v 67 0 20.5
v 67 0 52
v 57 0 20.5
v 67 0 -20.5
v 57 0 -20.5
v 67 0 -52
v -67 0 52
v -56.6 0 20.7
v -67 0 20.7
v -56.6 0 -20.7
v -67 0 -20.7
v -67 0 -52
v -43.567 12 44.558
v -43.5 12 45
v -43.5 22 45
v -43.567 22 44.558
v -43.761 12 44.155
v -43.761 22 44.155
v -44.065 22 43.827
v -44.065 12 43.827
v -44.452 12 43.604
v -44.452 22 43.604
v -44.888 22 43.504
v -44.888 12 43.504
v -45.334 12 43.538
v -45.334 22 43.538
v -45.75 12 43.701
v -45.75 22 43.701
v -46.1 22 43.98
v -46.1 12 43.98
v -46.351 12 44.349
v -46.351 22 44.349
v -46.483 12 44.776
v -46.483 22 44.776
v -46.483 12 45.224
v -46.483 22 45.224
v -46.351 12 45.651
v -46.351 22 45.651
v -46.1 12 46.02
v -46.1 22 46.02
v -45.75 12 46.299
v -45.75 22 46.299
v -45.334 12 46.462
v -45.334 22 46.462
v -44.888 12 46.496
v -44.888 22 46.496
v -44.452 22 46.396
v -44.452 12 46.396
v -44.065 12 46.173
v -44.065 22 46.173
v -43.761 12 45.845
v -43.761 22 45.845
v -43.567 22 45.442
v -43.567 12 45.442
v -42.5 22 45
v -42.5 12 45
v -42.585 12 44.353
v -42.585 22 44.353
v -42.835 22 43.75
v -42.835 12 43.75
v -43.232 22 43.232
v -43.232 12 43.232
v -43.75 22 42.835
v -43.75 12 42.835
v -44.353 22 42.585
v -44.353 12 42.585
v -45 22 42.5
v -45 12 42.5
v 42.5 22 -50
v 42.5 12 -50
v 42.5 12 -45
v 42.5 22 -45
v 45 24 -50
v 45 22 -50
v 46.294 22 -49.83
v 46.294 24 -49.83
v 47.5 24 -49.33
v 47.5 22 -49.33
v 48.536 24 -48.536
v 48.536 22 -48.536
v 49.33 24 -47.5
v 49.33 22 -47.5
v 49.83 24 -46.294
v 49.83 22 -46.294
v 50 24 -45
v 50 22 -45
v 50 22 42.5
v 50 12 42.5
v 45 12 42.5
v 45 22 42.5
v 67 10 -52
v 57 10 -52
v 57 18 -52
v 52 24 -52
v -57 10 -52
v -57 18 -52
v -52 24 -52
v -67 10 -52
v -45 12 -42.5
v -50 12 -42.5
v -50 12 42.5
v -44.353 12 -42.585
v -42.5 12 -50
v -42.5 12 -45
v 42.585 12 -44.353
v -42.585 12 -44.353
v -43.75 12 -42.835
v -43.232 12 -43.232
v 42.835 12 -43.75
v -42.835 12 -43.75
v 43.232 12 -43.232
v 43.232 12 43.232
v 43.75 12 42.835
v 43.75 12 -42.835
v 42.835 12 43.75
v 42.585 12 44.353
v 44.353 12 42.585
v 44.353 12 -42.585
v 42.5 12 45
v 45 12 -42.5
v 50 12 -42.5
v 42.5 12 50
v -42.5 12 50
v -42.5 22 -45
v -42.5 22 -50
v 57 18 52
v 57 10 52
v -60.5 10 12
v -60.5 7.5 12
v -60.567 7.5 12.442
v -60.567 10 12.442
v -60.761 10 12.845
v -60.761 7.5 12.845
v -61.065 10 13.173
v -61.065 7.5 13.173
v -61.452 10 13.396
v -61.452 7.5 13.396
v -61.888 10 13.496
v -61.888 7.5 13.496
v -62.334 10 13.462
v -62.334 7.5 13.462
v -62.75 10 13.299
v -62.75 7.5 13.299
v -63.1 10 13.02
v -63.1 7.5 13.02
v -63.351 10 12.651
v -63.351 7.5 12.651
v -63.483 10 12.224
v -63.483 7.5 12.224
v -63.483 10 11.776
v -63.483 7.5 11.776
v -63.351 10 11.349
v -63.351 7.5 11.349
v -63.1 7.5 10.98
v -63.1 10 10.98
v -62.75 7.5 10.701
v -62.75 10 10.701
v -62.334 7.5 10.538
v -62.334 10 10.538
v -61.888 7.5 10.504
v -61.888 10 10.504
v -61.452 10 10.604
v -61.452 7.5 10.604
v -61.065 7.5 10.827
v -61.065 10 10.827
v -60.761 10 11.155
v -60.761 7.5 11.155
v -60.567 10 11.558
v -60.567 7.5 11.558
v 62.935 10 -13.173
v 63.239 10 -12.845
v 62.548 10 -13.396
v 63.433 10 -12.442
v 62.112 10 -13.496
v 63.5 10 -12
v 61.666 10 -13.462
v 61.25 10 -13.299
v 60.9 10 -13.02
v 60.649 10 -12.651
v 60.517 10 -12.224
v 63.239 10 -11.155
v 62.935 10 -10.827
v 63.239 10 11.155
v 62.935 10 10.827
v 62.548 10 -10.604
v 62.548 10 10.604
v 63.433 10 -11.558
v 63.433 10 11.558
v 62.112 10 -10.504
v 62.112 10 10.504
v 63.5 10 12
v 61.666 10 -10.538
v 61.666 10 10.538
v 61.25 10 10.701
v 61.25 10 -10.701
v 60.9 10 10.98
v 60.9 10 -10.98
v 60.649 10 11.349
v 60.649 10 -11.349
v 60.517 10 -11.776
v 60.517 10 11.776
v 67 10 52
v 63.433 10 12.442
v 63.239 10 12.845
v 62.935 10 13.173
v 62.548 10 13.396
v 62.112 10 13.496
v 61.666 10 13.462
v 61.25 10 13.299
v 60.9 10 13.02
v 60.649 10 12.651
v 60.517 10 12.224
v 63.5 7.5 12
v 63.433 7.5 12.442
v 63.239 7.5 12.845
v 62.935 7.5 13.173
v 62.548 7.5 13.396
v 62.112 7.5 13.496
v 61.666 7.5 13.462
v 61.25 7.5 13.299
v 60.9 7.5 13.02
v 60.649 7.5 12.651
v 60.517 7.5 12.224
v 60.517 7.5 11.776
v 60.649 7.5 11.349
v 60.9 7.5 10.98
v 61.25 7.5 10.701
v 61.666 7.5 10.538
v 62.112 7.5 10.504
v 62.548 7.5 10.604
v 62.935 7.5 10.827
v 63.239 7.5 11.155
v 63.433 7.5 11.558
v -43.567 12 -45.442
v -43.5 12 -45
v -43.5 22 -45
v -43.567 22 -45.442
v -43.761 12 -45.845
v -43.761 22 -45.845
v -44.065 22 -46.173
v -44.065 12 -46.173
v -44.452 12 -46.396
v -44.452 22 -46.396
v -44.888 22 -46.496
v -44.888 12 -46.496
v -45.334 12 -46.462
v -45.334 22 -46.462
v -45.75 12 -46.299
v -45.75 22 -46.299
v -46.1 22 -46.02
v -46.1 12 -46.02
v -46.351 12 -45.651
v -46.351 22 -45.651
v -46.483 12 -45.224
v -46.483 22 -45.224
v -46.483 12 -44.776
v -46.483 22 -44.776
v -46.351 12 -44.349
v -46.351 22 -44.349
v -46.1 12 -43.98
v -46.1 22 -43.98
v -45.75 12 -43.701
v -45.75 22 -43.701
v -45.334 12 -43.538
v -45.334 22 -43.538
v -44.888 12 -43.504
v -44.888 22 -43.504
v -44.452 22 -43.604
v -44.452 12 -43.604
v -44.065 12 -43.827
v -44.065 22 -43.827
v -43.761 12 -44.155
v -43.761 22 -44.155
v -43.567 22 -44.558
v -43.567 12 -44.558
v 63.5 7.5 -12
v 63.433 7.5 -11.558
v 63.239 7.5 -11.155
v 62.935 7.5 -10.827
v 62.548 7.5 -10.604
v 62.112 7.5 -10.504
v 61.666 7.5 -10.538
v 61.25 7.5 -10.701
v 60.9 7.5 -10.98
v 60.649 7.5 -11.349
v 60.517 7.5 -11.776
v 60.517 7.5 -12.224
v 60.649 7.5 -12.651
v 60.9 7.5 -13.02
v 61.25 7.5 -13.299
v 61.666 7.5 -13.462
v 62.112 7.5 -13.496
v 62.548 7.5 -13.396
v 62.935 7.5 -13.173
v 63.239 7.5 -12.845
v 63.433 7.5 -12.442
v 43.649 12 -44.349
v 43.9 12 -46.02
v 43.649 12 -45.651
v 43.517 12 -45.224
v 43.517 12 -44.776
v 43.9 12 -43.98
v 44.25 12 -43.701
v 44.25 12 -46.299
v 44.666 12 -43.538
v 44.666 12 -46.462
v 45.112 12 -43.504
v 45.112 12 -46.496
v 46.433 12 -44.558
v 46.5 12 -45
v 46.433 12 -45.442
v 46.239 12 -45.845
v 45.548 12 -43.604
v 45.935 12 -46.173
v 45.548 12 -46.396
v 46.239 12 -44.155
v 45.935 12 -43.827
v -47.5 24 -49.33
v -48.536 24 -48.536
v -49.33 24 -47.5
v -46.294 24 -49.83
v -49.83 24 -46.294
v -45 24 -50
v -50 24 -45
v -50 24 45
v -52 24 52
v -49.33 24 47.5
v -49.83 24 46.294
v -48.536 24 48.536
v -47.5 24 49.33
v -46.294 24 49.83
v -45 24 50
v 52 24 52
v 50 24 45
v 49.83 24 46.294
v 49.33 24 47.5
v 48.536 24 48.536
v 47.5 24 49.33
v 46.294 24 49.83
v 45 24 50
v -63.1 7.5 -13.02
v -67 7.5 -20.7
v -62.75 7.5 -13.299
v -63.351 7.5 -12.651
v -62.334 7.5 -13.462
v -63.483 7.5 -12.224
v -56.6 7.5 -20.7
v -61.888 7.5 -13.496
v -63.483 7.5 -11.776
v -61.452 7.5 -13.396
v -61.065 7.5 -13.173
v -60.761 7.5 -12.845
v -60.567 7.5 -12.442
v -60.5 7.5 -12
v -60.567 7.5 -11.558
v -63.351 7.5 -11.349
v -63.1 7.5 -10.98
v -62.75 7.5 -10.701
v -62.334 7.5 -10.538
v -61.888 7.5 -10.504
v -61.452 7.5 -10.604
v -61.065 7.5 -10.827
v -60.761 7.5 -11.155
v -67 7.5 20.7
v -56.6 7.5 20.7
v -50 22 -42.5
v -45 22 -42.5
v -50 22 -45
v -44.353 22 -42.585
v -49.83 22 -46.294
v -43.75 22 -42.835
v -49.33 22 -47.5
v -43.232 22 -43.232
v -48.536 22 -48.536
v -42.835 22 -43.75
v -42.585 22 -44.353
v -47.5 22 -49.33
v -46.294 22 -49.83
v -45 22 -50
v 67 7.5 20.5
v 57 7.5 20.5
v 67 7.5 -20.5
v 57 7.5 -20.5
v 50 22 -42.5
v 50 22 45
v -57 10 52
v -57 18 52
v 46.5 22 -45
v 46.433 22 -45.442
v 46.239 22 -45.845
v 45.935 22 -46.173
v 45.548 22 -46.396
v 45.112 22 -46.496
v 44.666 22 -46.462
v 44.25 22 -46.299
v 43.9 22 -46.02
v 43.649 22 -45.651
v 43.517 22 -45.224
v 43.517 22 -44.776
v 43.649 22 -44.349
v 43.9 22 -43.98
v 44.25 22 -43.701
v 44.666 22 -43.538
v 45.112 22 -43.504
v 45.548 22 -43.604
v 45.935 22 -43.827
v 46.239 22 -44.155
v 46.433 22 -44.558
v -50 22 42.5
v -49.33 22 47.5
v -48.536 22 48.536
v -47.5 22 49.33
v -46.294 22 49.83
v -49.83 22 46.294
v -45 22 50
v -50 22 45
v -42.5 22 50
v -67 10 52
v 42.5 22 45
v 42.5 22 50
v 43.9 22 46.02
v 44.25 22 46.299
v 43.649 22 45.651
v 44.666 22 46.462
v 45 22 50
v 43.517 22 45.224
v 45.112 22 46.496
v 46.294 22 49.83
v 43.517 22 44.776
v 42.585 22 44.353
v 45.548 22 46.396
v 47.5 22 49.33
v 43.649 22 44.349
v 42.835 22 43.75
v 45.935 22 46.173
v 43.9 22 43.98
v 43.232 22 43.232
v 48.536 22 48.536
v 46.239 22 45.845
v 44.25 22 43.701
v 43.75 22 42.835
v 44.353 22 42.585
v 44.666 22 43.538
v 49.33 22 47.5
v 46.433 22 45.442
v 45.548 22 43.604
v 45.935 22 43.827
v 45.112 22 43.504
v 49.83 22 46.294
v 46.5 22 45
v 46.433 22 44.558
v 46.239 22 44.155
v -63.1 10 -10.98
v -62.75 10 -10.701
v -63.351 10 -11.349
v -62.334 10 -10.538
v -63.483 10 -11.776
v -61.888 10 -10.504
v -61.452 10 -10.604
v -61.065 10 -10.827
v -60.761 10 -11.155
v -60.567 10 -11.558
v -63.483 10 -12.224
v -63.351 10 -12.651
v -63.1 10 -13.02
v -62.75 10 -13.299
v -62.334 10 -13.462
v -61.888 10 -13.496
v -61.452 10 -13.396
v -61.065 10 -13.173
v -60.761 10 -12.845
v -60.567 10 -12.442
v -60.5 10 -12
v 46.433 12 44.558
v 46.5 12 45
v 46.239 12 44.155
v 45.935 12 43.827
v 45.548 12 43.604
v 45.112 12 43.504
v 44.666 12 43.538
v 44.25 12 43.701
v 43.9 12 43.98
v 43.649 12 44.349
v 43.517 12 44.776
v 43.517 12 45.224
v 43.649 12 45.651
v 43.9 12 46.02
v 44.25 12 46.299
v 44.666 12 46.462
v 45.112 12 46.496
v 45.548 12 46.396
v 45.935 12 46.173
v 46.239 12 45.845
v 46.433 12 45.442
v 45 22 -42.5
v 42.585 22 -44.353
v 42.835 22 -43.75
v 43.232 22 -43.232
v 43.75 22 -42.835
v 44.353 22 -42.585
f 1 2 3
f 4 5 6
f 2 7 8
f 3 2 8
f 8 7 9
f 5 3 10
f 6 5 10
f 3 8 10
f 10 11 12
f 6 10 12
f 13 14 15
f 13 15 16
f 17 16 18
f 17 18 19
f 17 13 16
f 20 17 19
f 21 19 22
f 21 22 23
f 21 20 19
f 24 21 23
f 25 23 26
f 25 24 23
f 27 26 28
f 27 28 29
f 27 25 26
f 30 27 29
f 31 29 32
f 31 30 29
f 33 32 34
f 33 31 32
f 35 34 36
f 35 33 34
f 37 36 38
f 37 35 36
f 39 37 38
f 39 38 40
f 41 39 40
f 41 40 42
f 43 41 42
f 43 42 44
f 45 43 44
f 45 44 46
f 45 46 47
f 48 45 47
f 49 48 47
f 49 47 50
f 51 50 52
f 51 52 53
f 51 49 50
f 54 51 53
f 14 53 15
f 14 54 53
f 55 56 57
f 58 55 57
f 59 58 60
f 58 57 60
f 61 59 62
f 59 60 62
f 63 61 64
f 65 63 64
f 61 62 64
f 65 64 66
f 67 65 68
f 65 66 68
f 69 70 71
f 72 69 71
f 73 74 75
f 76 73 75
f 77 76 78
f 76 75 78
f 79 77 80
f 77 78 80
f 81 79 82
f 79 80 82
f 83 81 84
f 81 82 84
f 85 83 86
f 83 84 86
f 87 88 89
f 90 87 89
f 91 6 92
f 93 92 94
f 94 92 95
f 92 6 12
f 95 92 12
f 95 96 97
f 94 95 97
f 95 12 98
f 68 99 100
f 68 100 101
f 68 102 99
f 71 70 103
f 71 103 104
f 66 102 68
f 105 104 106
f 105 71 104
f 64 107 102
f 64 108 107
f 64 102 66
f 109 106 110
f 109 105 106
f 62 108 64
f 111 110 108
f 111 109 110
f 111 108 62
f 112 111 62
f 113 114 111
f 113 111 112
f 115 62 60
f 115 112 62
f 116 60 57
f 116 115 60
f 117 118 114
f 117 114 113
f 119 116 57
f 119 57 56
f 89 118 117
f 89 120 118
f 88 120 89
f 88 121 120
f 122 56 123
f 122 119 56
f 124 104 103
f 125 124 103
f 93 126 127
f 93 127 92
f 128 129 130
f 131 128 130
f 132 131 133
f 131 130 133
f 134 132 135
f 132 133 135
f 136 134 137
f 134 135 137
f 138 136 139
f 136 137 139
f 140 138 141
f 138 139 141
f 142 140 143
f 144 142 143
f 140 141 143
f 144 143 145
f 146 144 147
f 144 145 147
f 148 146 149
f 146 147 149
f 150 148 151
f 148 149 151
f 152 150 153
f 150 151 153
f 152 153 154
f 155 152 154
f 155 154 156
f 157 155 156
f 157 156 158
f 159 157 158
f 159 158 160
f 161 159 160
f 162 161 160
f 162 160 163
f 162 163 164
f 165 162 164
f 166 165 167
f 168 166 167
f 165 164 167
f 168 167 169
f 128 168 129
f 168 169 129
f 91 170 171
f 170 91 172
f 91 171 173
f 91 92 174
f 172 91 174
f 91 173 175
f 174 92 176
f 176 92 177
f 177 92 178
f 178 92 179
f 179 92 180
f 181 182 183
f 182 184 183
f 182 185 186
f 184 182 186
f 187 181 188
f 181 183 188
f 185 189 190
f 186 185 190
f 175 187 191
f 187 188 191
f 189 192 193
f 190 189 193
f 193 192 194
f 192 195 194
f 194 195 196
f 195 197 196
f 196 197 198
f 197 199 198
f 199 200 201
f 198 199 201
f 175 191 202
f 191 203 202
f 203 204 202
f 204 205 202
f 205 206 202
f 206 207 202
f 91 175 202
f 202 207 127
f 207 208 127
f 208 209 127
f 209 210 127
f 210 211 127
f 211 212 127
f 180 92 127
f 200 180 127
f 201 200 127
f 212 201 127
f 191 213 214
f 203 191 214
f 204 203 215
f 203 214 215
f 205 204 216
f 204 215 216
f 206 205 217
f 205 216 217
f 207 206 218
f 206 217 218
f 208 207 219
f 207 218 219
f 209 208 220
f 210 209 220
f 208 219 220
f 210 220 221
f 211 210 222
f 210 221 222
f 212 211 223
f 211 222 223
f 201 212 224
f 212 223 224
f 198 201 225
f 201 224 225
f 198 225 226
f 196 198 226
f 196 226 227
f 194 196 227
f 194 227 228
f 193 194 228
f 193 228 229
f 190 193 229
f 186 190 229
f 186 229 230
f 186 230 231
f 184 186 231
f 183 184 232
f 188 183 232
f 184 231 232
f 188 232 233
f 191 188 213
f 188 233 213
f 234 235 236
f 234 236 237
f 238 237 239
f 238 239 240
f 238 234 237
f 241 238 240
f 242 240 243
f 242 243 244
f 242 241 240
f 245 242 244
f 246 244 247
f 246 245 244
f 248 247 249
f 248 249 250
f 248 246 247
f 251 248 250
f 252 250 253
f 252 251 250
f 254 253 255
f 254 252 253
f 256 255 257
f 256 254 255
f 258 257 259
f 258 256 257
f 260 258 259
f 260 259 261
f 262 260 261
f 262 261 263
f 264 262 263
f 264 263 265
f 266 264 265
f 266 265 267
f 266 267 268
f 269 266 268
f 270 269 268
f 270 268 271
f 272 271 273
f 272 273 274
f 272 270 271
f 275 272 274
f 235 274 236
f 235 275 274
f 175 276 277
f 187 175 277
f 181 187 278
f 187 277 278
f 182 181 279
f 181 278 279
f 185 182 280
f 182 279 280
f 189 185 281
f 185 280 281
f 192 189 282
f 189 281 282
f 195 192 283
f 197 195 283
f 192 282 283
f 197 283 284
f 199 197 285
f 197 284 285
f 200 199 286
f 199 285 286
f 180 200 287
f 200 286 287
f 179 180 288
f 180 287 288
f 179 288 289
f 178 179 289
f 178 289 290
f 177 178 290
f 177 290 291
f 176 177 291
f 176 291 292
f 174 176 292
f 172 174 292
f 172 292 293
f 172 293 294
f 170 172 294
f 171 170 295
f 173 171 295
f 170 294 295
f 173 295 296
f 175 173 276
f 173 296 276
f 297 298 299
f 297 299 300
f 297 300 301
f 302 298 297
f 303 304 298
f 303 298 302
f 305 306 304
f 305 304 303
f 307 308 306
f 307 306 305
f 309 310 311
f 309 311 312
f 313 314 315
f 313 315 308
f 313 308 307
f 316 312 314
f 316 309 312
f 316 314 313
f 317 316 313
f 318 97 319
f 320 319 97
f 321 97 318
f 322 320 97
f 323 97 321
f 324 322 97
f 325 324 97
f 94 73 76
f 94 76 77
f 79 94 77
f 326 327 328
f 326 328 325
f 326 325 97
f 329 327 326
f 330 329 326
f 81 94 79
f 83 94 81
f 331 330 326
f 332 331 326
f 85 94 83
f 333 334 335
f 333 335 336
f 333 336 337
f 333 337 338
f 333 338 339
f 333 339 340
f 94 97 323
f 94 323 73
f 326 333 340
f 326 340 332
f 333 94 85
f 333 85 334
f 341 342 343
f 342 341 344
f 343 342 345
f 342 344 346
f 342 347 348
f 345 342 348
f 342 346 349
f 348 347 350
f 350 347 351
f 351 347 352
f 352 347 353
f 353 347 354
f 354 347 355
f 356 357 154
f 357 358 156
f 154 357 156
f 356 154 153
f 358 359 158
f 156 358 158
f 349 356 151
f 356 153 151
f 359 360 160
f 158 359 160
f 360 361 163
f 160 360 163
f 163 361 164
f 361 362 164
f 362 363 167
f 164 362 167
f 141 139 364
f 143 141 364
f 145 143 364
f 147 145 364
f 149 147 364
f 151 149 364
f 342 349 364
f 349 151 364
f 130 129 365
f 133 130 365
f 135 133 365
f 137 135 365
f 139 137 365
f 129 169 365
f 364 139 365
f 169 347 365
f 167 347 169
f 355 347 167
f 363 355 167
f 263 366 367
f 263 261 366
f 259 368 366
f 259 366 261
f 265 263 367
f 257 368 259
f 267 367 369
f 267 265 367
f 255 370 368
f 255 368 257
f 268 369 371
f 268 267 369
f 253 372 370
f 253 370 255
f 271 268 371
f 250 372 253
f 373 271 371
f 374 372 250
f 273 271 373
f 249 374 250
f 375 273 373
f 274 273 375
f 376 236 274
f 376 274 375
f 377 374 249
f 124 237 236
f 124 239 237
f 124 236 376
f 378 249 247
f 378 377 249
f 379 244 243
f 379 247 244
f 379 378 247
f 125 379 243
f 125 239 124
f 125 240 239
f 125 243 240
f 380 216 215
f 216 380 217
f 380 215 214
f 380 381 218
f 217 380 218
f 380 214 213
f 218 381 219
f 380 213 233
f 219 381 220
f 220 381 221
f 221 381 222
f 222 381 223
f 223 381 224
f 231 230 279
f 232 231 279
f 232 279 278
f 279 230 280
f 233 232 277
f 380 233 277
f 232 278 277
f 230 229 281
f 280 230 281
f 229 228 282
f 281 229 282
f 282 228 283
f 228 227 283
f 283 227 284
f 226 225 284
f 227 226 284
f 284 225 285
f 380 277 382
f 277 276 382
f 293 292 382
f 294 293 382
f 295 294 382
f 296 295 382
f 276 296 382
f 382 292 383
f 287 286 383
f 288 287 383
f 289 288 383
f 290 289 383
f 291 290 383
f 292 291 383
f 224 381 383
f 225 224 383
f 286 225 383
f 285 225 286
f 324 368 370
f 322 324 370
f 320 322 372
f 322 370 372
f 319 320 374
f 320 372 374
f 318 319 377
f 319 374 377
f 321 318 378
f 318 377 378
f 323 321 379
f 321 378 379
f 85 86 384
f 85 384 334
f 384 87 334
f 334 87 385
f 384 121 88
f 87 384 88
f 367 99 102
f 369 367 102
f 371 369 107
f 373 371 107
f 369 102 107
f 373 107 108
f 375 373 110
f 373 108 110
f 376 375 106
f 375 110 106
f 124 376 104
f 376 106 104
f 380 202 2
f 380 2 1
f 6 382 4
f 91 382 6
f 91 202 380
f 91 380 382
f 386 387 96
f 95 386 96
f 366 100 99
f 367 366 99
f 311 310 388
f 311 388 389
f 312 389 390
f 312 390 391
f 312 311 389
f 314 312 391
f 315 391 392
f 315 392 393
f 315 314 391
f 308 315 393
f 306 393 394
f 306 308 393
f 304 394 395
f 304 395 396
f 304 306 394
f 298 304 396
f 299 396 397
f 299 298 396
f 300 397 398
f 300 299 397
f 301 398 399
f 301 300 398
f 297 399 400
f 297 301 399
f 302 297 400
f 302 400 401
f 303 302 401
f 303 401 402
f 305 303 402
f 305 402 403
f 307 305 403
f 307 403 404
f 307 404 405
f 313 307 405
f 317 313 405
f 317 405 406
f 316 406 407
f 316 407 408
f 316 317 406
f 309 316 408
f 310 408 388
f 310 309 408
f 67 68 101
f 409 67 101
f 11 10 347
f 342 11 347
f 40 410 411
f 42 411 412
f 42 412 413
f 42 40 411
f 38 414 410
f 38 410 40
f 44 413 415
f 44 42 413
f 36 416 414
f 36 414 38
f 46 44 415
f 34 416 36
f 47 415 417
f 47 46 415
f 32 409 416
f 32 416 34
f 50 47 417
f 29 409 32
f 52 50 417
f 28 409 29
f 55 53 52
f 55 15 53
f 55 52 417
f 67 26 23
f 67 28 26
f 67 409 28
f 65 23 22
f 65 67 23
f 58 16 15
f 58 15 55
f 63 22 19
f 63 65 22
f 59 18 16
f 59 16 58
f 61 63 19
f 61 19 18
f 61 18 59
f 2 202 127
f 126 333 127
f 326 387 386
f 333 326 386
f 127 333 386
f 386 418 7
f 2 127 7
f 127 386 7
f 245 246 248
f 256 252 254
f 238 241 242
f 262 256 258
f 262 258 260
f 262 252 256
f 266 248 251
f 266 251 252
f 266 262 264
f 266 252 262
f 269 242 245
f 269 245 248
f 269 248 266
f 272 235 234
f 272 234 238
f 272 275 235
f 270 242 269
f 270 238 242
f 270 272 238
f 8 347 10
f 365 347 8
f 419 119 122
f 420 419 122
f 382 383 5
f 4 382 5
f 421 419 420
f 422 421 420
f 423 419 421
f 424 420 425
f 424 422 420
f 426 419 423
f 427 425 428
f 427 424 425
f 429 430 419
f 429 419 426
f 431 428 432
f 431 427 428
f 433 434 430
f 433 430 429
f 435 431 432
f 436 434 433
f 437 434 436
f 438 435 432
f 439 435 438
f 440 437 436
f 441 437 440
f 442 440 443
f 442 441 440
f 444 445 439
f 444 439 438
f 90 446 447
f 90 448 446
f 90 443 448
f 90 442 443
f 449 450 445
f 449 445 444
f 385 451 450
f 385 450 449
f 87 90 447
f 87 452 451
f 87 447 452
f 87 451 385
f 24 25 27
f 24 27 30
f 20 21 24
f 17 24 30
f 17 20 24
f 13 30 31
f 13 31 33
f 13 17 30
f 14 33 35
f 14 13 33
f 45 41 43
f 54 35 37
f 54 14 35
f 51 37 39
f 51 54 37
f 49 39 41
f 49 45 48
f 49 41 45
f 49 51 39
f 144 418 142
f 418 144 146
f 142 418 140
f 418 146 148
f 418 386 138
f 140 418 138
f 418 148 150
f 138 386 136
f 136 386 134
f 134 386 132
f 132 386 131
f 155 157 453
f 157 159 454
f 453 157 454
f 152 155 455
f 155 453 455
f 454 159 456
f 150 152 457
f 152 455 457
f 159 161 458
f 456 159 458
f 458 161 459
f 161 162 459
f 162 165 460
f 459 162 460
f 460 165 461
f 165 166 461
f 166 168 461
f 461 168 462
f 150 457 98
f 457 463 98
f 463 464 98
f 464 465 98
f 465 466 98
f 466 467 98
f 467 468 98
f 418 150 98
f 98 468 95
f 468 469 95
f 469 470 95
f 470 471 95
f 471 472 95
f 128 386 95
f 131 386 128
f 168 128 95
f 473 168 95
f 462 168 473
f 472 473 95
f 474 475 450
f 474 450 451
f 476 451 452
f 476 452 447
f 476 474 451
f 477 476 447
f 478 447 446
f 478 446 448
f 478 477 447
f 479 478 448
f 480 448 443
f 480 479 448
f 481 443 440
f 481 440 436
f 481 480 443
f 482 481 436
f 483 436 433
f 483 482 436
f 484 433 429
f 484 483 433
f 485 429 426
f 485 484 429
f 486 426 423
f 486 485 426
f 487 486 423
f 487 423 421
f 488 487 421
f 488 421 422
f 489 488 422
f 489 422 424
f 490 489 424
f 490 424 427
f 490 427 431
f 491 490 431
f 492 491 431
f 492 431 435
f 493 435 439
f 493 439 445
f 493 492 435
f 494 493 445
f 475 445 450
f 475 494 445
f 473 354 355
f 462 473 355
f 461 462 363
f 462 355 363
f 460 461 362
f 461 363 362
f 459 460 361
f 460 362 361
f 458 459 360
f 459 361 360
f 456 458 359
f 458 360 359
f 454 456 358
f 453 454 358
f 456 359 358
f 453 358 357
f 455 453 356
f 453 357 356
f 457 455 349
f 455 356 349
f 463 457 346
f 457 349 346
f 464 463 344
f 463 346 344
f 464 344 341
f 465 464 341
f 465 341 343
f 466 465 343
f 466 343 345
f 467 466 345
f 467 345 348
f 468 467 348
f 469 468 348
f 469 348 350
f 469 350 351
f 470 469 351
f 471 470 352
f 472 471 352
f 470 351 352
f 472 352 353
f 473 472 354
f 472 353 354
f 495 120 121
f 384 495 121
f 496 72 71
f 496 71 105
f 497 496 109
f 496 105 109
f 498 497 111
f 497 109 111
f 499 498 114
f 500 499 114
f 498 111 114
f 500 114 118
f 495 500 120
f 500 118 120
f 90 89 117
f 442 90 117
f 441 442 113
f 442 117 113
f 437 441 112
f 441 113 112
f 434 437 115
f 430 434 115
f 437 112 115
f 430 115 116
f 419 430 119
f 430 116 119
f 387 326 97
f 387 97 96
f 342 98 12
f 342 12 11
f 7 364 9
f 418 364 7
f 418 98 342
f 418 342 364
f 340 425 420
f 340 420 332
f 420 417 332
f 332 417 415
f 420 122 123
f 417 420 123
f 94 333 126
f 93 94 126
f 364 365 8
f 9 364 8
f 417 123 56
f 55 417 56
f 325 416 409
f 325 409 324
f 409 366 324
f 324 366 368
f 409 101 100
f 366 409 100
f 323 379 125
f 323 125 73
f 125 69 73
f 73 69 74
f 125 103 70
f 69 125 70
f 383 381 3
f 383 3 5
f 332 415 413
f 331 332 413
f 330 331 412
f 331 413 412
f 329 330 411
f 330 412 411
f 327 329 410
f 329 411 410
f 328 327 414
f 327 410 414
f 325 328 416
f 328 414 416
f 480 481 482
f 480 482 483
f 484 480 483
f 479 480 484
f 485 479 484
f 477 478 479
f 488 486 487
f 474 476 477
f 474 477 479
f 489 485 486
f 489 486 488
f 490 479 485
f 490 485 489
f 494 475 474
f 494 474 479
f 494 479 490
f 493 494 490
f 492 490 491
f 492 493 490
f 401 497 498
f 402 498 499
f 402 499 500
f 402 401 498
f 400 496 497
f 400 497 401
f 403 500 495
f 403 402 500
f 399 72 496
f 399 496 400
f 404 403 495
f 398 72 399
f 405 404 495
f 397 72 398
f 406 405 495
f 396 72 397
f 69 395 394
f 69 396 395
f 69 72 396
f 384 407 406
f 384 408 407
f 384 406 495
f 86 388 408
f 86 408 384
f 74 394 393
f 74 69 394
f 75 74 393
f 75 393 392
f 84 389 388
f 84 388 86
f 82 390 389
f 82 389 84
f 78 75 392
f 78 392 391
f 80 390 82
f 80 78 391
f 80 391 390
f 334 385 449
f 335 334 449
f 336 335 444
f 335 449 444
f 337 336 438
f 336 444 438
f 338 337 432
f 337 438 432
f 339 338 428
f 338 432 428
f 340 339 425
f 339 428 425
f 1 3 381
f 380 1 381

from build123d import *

# Parameters (mm, degrees)
BOSS_EXTRUDE3_DEPTH  = 12
BOSS_EXTRUDE5_DEPTH  = 12
BOSS_EXTRUDE6_DEPTH  = 12
BOSS_EXTRUDE7_DEPTH  = 12
SKETCH13_W           = 102
SKETCH13_H           = 12
BOSS_EXTRUDE11_DEPTH = 1
SKETCH14_W           = 103
SKETCH14_H           = 12
BOSS_EXTRUDE12_DEPTH = 1
SKETCH15_W           = 103
SKETCH15_H           = 12
BOSS_EXTRUDE13_DEPTH = 1
SKETCH16_W           = 104
SKETCH16_H           = 12
BOSS_EXTRUDE14_DEPTH = 1
SKETCH17_W           = 104
SKETCH17_H           = 104
BOSS_EXTRUDE16_DEPTH = 12
SKETCH20_W           = 104
SKETCH20_H           = 24
BOSS_EXTRUDE20_DEPTH = 10
CUT_EXTRUDE2_DEPTH   = 104
SKETCH23_W           = 104
SKETCH23_H           = 24
BOSS_EXTRUDE21_DEPTH = 10
CUT_EXTRUDE3_DEPTH   = 104
SKETCH26_W           = 10.4
SKETCH26_H           = 41.4
SKETCH26_W_2         = 10
SKETCH26_H_2         = 41
CUT_EXTRUDE5_DEPTH   = 7.5
SKETCH29_W           = 5
SKETCH29_H           = 104
CUT_EXTRUDE6_DEPTH   = 8
SKETCH30_W           = 5
SKETCH30_H           = 104
CUT_EXTRUDE7_DEPTH   = 8
BOSS_EXTRUDE22_DEPTH = 5
SKETCH33_W           = 41.4
SKETCH33_H           = 7.5
BOSS_EXTRUDE23_DEPTH = 5
BOSS_EXTRUDE24_DEPTH = 5
SKETCH35_W           = 41
SKETCH35_H           = 7.5
BOSS_EXTRUDE25_DEPTH = 5
SKETCH36_R           = 1.5
CUT_EXTRUDE8_DEPTH   = 2.5
SKETCH37_R           = 1.5
CUT_EXTRUDE9_DEPTH   = 2.5
SKETCH38_R           = 2.5
SKETCH38_R_2         = 1.5
BOSS_EXTRUDE26_DEPTH = 10


with BuildPart() as part:
    # Sketch1 → Boss-Extrude3 (new body)
    with BuildSketch(Plane(origin=(0, 0, 0), x_dir=(1, 0, 0), z_dir=(0, 1, 0))):
        with BuildLine():
            Line((-46, 51), (46, 51))
            ThreePointArc((46, 51), (49.535533906, 49.535533906), (51, 46))
            Line((51, 46), (51, -46))
            ThreePointArc((51, -46), (49.535533906, -49.535533906), (46, -51))
            Line((46, -51), (-46, -51))
            ThreePointArc((-46, -51), (-49.535533906, -49.535533906), (-51, -46))
            Line((-51, -46), (-51, 46))
            ThreePointArc((-51, 46), (-49.535533906, 49.535533906), (-46, 51))
        make_face()
    extrude(amount=BOSS_EXTRUDE3_DEPTH)

    # Sketch4 → Boss-Extrude5 (add)
    with BuildSketch(Plane(origin=(0, 0, 0), x_dir=(-1, 0, 0), z_dir=(0, -1, 0))):
        with BuildLine():
            Line((-46, -51), (-51, -51))
            Line((-51, -51), (-51, -46))
            ThreePointArc((-51, -46), (-49.535533906, -49.535533906), (-46, -51))
        make_face()
    extrude(amount=-BOSS_EXTRUDE5_DEPTH)

    # Sketch6 → Boss-Extrude6 (add)
    with BuildSketch(Plane.XZ):
        with BuildLine():
            Line((-51, -46), (-51, -51))
            Line((-51, -51), (-46, -51))
            ThreePointArc((-46, -51), (-49.535533906, -49.535533906), (-51, -46))
        make_face()
    extrude(amount=-BOSS_EXTRUDE6_DEPTH)

    # Sketch7 → Boss-Extrude7 (add)
    with BuildSketch(Plane.XZ):
        with BuildLine():
            Line((-46, 51), (-51, 51))
            Line((-51, 51), (-51, 46))
            ThreePointArc((-51, 46), (-49.535533906, 49.535533906), (-46, 51))
        make_face()
        with BuildLine():
            Line((46, -51), (51, -51))
            Line((51, -51), (51, -46))
            ThreePointArc((51, -46), (49.535533906, -49.535533906), (46, -51))
        make_face()
    extrude(amount=-BOSS_EXTRUDE7_DEPTH)

    # Sketch13 → Boss-Extrude11 (add)
    with BuildSketch(Plane.XY.offset(51)):
        with Locations((0, 6)):
            Rectangle(SKETCH13_W, SKETCH13_H)
    extrude(amount=BOSS_EXTRUDE11_DEPTH)

    # Sketch14 → Boss-Extrude12 (add)
    with BuildSketch(Plane(origin=(51, 0, 0), x_dir=(0, 0, -1), z_dir=(1, 0, 0))):
        with Locations((-0.5, 6)):
            Rectangle(SKETCH14_W, SKETCH14_H)
    extrude(amount=BOSS_EXTRUDE12_DEPTH)

    # Sketch15 → Boss-Extrude13 (add)
    with BuildSketch(Plane(origin=(0, 0, -51), x_dir=(-1, 0, 0), z_dir=(0, 0, -1))):
        with Locations((-0.5, 6)):
            Rectangle(SKETCH15_W, SKETCH15_H)
    extrude(amount=BOSS_EXTRUDE13_DEPTH)

    # Sketch16 → Boss-Extrude14 (add)
    with BuildSketch(Plane.ZY.offset(51)):
        with Locations((0, 6)):
            Rectangle(SKETCH16_W, SKETCH16_H)
    extrude(amount=BOSS_EXTRUDE14_DEPTH)

    # Sketch17 → Boss-Extrude16 (add)
    with BuildSketch(Plane(origin=(0, 12, 0), x_dir=(1, 0, 0), z_dir=(0, 1, 0))):
        Rectangle(SKETCH17_W, SKETCH17_H)
        with BuildLine():
            Line((-45, 50), (45, 50))
            ThreePointArc((45, 50), (48.535533906, 48.535533906), (50, 45))
            Line((50, 45), (50, -45))
            ThreePointArc((50, -45), (48.535533906, -48.535533906), (45, -50))
            Line((45, -50), (-45, -50))
            ThreePointArc((-45, -50), (-48.535533906, -48.535533906), (-50, -45))
            Line((-50, -45), (-50, 45))
            ThreePointArc((-50, 45), (-48.535533906, 48.535533906), (-45, 50))
        make_face(mode=Mode.SUBTRACT)
    extrude(amount=BOSS_EXTRUDE16_DEPTH)

    # Sketch20 → Boss-Extrude20 (add)
    with BuildSketch(Plane(origin=(52, 0, 0), x_dir=(0, 0, -1), z_dir=(1, 0, 0))):
        with Locations((0, 12)):
            Rectangle(SKETCH20_W, SKETCH20_H)
    extrude(amount=BOSS_EXTRUDE20_DEPTH)

    # Sketch21 → Cut-Extrude2 (cut)
    with BuildSketch(Plane.XY.offset(52)):
        Polygon((62, 24), (52, 24), (57, 18), (62, 18), align=None)
    extrude(amount=-CUT_EXTRUDE2_DEPTH, mode=Mode.SUBTRACT)

    # Sketch23 → Boss-Extrude21 (add)
    with BuildSketch(Plane.ZY.offset(52)):
        with Locations((0, 12)):
            Rectangle(SKETCH23_W, SKETCH23_H)
    extrude(amount=BOSS_EXTRUDE21_DEPTH)

    # Sketch24 → Cut-Extrude3 (cut)
    with BuildSketch(Plane.XY.offset(52)):
        Polygon((-62, 24), (-52, 24), (-57, 18), (-62, 18), align=None)
    extrude(amount=-CUT_EXTRUDE3_DEPTH, mode=Mode.SUBTRACT)

    # Sketch26 → Cut-Extrude5 (cut)
    with BuildSketch(Plane.XZ):
        with Locations((-56.8, 0)):
            Rectangle(SKETCH26_W, SKETCH26_H)
        with Locations((57, 0)):
            Rectangle(SKETCH26_W_2, SKETCH26_H_2)
    extrude(amount=-CUT_EXTRUDE5_DEPTH, mode=Mode.SUBTRACT)

    # Sketch29 → Cut-Extrude6 (cut)
    with BuildSketch(Plane(origin=(0, 18, 0), x_dir=(1, 0, 0), z_dir=(0, 1, 0))):
        with Locations((59.5, 0)):
            Rectangle(SKETCH29_W, SKETCH29_H)
    extrude(amount=-CUT_EXTRUDE6_DEPTH, mode=Mode.SUBTRACT)

    # Sketch30 → Cut-Extrude7 (cut)
    with BuildSketch(Plane(origin=(0, 18, 0), x_dir=(1, 0, 0), z_dir=(0, 1, 0))):
        with Locations((-59.5, 0)):
            Rectangle(SKETCH30_W, SKETCH30_H)
    extrude(amount=-CUT_EXTRUDE7_DEPTH, mode=Mode.SUBTRACT)

    # Sketch32 → Boss-Extrude22 (add)
    with BuildSketch(Plane.ZY.offset(62)):
        Polygon((-52, 10), (-52, 0), (-20.7, 0), (-20.7, 7.5), (20.7, 7.5), (20.7, 0), (52, 0), (52, 10), align=None)
    extrude(amount=BOSS_EXTRUDE22_DEPTH)

    # Sketch33 → Boss-Extrude23 (add)
    with BuildSketch(Plane.ZY.offset(51.6)):
        with Locations((0, 3.75)):
            Rectangle(SKETCH33_W, SKETCH33_H)
    extrude(amount=BOSS_EXTRUDE23_DEPTH)

    # Sketch34 → Boss-Extrude24 (add)
    with BuildSketch(Plane(origin=(62, 0, 0), x_dir=(0, 0, -1), z_dir=(1, 0, 0))):
        Polygon((-52, 10), (-52, 0), (-20.5, 0), (-20.5, 7.5), (20.5, 7.5), (20.5, 0), (52, 0), (52, 10), align=None)
    extrude(amount=BOSS_EXTRUDE24_DEPTH)

    # Sketch35 → Boss-Extrude25 (add)
    with BuildSketch(Plane(origin=(52, 0, 0), x_dir=(0, 0, -1), z_dir=(1, 0, 0))):
        with Locations((0, 3.75)):
            Rectangle(SKETCH35_W, SKETCH35_H)
    extrude(amount=BOSS_EXTRUDE25_DEPTH)

    # Sketch36 → Cut-Extrude8 (cut)
    with BuildSketch(Plane.XZ.offset(-7.5)):
        with Locations((62, 12)):
            Circle(SKETCH36_R)
        with Locations((62, -12)):
            Circle(SKETCH36_R)
    extrude(amount=-CUT_EXTRUDE8_DEPTH, mode=Mode.SUBTRACT)

    # Sketch37 → Cut-Extrude9 (cut)
    with BuildSketch(Plane.XZ.offset(-7.5)):
        with Locations((-62, 12)):
            Circle(SKETCH37_R)
        with Locations((-62, -12)):
            Circle(SKETCH37_R)
    extrude(amount=-CUT_EXTRUDE9_DEPTH, mode=Mode.SUBTRACT)

    # Sketch38 → Boss-Extrude26 (add)
    with BuildSketch(Plane(origin=(0, 12, 0), x_dir=(1, 0, 0), z_dir=(0, 1, 0))):
        with BuildLine():
            Line((-42.5, 50), (-45, 50))
            ThreePointArc((-45, 50), (-48.535533906, 48.535533906), (-50, 45))
            Line((-50, 45), (-50, 42.5))
            Line((-50, 42.5), (-45, 42.5))
            ThreePointArc((-45, 42.5), (-46.767766953, 46.767766953), (-42.5, 45))
            Line((-42.5, 45), (-42.5, 50))
        make_face()
        with Locations((-45, 45)):
            Circle(SKETCH38_R)
        with Locations((-45, 45)):
            Circle(SKETCH38_R_2, mode=Mode.SUBTRACT)
        with BuildLine():
            Line((45, 50), (42.5, 50))
            Line((42.5, 50), (42.5, 45))
            ThreePointArc((42.5, 45), (45, 47.5), (47.5, 45))
            ThreePointArc((47.5, 45), (46.767766953, 43.232233047), (45, 42.5))
            Line((45, 42.5), (50, 42.5))
            Line((50, 42.5), (50, 45))
            ThreePointArc((50, 45), (48.535533906, 48.535533906), (45, 50))
        make_face()
        with Locations((45, 45)):
            Circle(SKETCH38_R)
        with Locations((45, 45)):
            Circle(SKETCH38_R_2, mode=Mode.SUBTRACT)
        with BuildLine():
            Line((-45, -42.5), (-50, -42.5))
            Line((-50, -42.5), (-50, -45))
            ThreePointArc((-50, -45), (-48.535533906, -48.535533906), (-45, -50))
            Line((-45, -50), (-42.5, -50))
            Line((-42.5, -50), (-42.5, -45))
            ThreePointArc((-42.5, -45), (-46.767766953, -46.767766953), (-45, -42.5))
        make_face()
        with Locations((-45, -45)):
            Circle(SKETCH38_R)
        with Locations((-45, -45)):
            Circle(SKETCH38_R_2, mode=Mode.SUBTRACT)
        with BuildLine():
            Line((50, -45), (50, -42.5))
            Line((50, -42.5), (45, -42.5))
            ThreePointArc((45, -42.5), (46.767766953, -43.232233047), (47.5, -45))
            ThreePointArc((47.5, -45), (45, -47.5), (42.5, -45))
            Line((42.5, -45), (42.5, -50))
            Line((42.5, -50), (45, -50))
            ThreePointArc((45, -50), (48.535533906, -48.535533906), (50, -45))
        make_face()
        with Locations((45, -45)):
            Circle(SKETCH38_R)
        with Locations((45, -45)):
            Circle(SKETCH38_R_2, mode=Mode.SUBTRACT)
    extrude(amount=BOSS_EXTRUDE26_DEPTH)


solid = part.part
